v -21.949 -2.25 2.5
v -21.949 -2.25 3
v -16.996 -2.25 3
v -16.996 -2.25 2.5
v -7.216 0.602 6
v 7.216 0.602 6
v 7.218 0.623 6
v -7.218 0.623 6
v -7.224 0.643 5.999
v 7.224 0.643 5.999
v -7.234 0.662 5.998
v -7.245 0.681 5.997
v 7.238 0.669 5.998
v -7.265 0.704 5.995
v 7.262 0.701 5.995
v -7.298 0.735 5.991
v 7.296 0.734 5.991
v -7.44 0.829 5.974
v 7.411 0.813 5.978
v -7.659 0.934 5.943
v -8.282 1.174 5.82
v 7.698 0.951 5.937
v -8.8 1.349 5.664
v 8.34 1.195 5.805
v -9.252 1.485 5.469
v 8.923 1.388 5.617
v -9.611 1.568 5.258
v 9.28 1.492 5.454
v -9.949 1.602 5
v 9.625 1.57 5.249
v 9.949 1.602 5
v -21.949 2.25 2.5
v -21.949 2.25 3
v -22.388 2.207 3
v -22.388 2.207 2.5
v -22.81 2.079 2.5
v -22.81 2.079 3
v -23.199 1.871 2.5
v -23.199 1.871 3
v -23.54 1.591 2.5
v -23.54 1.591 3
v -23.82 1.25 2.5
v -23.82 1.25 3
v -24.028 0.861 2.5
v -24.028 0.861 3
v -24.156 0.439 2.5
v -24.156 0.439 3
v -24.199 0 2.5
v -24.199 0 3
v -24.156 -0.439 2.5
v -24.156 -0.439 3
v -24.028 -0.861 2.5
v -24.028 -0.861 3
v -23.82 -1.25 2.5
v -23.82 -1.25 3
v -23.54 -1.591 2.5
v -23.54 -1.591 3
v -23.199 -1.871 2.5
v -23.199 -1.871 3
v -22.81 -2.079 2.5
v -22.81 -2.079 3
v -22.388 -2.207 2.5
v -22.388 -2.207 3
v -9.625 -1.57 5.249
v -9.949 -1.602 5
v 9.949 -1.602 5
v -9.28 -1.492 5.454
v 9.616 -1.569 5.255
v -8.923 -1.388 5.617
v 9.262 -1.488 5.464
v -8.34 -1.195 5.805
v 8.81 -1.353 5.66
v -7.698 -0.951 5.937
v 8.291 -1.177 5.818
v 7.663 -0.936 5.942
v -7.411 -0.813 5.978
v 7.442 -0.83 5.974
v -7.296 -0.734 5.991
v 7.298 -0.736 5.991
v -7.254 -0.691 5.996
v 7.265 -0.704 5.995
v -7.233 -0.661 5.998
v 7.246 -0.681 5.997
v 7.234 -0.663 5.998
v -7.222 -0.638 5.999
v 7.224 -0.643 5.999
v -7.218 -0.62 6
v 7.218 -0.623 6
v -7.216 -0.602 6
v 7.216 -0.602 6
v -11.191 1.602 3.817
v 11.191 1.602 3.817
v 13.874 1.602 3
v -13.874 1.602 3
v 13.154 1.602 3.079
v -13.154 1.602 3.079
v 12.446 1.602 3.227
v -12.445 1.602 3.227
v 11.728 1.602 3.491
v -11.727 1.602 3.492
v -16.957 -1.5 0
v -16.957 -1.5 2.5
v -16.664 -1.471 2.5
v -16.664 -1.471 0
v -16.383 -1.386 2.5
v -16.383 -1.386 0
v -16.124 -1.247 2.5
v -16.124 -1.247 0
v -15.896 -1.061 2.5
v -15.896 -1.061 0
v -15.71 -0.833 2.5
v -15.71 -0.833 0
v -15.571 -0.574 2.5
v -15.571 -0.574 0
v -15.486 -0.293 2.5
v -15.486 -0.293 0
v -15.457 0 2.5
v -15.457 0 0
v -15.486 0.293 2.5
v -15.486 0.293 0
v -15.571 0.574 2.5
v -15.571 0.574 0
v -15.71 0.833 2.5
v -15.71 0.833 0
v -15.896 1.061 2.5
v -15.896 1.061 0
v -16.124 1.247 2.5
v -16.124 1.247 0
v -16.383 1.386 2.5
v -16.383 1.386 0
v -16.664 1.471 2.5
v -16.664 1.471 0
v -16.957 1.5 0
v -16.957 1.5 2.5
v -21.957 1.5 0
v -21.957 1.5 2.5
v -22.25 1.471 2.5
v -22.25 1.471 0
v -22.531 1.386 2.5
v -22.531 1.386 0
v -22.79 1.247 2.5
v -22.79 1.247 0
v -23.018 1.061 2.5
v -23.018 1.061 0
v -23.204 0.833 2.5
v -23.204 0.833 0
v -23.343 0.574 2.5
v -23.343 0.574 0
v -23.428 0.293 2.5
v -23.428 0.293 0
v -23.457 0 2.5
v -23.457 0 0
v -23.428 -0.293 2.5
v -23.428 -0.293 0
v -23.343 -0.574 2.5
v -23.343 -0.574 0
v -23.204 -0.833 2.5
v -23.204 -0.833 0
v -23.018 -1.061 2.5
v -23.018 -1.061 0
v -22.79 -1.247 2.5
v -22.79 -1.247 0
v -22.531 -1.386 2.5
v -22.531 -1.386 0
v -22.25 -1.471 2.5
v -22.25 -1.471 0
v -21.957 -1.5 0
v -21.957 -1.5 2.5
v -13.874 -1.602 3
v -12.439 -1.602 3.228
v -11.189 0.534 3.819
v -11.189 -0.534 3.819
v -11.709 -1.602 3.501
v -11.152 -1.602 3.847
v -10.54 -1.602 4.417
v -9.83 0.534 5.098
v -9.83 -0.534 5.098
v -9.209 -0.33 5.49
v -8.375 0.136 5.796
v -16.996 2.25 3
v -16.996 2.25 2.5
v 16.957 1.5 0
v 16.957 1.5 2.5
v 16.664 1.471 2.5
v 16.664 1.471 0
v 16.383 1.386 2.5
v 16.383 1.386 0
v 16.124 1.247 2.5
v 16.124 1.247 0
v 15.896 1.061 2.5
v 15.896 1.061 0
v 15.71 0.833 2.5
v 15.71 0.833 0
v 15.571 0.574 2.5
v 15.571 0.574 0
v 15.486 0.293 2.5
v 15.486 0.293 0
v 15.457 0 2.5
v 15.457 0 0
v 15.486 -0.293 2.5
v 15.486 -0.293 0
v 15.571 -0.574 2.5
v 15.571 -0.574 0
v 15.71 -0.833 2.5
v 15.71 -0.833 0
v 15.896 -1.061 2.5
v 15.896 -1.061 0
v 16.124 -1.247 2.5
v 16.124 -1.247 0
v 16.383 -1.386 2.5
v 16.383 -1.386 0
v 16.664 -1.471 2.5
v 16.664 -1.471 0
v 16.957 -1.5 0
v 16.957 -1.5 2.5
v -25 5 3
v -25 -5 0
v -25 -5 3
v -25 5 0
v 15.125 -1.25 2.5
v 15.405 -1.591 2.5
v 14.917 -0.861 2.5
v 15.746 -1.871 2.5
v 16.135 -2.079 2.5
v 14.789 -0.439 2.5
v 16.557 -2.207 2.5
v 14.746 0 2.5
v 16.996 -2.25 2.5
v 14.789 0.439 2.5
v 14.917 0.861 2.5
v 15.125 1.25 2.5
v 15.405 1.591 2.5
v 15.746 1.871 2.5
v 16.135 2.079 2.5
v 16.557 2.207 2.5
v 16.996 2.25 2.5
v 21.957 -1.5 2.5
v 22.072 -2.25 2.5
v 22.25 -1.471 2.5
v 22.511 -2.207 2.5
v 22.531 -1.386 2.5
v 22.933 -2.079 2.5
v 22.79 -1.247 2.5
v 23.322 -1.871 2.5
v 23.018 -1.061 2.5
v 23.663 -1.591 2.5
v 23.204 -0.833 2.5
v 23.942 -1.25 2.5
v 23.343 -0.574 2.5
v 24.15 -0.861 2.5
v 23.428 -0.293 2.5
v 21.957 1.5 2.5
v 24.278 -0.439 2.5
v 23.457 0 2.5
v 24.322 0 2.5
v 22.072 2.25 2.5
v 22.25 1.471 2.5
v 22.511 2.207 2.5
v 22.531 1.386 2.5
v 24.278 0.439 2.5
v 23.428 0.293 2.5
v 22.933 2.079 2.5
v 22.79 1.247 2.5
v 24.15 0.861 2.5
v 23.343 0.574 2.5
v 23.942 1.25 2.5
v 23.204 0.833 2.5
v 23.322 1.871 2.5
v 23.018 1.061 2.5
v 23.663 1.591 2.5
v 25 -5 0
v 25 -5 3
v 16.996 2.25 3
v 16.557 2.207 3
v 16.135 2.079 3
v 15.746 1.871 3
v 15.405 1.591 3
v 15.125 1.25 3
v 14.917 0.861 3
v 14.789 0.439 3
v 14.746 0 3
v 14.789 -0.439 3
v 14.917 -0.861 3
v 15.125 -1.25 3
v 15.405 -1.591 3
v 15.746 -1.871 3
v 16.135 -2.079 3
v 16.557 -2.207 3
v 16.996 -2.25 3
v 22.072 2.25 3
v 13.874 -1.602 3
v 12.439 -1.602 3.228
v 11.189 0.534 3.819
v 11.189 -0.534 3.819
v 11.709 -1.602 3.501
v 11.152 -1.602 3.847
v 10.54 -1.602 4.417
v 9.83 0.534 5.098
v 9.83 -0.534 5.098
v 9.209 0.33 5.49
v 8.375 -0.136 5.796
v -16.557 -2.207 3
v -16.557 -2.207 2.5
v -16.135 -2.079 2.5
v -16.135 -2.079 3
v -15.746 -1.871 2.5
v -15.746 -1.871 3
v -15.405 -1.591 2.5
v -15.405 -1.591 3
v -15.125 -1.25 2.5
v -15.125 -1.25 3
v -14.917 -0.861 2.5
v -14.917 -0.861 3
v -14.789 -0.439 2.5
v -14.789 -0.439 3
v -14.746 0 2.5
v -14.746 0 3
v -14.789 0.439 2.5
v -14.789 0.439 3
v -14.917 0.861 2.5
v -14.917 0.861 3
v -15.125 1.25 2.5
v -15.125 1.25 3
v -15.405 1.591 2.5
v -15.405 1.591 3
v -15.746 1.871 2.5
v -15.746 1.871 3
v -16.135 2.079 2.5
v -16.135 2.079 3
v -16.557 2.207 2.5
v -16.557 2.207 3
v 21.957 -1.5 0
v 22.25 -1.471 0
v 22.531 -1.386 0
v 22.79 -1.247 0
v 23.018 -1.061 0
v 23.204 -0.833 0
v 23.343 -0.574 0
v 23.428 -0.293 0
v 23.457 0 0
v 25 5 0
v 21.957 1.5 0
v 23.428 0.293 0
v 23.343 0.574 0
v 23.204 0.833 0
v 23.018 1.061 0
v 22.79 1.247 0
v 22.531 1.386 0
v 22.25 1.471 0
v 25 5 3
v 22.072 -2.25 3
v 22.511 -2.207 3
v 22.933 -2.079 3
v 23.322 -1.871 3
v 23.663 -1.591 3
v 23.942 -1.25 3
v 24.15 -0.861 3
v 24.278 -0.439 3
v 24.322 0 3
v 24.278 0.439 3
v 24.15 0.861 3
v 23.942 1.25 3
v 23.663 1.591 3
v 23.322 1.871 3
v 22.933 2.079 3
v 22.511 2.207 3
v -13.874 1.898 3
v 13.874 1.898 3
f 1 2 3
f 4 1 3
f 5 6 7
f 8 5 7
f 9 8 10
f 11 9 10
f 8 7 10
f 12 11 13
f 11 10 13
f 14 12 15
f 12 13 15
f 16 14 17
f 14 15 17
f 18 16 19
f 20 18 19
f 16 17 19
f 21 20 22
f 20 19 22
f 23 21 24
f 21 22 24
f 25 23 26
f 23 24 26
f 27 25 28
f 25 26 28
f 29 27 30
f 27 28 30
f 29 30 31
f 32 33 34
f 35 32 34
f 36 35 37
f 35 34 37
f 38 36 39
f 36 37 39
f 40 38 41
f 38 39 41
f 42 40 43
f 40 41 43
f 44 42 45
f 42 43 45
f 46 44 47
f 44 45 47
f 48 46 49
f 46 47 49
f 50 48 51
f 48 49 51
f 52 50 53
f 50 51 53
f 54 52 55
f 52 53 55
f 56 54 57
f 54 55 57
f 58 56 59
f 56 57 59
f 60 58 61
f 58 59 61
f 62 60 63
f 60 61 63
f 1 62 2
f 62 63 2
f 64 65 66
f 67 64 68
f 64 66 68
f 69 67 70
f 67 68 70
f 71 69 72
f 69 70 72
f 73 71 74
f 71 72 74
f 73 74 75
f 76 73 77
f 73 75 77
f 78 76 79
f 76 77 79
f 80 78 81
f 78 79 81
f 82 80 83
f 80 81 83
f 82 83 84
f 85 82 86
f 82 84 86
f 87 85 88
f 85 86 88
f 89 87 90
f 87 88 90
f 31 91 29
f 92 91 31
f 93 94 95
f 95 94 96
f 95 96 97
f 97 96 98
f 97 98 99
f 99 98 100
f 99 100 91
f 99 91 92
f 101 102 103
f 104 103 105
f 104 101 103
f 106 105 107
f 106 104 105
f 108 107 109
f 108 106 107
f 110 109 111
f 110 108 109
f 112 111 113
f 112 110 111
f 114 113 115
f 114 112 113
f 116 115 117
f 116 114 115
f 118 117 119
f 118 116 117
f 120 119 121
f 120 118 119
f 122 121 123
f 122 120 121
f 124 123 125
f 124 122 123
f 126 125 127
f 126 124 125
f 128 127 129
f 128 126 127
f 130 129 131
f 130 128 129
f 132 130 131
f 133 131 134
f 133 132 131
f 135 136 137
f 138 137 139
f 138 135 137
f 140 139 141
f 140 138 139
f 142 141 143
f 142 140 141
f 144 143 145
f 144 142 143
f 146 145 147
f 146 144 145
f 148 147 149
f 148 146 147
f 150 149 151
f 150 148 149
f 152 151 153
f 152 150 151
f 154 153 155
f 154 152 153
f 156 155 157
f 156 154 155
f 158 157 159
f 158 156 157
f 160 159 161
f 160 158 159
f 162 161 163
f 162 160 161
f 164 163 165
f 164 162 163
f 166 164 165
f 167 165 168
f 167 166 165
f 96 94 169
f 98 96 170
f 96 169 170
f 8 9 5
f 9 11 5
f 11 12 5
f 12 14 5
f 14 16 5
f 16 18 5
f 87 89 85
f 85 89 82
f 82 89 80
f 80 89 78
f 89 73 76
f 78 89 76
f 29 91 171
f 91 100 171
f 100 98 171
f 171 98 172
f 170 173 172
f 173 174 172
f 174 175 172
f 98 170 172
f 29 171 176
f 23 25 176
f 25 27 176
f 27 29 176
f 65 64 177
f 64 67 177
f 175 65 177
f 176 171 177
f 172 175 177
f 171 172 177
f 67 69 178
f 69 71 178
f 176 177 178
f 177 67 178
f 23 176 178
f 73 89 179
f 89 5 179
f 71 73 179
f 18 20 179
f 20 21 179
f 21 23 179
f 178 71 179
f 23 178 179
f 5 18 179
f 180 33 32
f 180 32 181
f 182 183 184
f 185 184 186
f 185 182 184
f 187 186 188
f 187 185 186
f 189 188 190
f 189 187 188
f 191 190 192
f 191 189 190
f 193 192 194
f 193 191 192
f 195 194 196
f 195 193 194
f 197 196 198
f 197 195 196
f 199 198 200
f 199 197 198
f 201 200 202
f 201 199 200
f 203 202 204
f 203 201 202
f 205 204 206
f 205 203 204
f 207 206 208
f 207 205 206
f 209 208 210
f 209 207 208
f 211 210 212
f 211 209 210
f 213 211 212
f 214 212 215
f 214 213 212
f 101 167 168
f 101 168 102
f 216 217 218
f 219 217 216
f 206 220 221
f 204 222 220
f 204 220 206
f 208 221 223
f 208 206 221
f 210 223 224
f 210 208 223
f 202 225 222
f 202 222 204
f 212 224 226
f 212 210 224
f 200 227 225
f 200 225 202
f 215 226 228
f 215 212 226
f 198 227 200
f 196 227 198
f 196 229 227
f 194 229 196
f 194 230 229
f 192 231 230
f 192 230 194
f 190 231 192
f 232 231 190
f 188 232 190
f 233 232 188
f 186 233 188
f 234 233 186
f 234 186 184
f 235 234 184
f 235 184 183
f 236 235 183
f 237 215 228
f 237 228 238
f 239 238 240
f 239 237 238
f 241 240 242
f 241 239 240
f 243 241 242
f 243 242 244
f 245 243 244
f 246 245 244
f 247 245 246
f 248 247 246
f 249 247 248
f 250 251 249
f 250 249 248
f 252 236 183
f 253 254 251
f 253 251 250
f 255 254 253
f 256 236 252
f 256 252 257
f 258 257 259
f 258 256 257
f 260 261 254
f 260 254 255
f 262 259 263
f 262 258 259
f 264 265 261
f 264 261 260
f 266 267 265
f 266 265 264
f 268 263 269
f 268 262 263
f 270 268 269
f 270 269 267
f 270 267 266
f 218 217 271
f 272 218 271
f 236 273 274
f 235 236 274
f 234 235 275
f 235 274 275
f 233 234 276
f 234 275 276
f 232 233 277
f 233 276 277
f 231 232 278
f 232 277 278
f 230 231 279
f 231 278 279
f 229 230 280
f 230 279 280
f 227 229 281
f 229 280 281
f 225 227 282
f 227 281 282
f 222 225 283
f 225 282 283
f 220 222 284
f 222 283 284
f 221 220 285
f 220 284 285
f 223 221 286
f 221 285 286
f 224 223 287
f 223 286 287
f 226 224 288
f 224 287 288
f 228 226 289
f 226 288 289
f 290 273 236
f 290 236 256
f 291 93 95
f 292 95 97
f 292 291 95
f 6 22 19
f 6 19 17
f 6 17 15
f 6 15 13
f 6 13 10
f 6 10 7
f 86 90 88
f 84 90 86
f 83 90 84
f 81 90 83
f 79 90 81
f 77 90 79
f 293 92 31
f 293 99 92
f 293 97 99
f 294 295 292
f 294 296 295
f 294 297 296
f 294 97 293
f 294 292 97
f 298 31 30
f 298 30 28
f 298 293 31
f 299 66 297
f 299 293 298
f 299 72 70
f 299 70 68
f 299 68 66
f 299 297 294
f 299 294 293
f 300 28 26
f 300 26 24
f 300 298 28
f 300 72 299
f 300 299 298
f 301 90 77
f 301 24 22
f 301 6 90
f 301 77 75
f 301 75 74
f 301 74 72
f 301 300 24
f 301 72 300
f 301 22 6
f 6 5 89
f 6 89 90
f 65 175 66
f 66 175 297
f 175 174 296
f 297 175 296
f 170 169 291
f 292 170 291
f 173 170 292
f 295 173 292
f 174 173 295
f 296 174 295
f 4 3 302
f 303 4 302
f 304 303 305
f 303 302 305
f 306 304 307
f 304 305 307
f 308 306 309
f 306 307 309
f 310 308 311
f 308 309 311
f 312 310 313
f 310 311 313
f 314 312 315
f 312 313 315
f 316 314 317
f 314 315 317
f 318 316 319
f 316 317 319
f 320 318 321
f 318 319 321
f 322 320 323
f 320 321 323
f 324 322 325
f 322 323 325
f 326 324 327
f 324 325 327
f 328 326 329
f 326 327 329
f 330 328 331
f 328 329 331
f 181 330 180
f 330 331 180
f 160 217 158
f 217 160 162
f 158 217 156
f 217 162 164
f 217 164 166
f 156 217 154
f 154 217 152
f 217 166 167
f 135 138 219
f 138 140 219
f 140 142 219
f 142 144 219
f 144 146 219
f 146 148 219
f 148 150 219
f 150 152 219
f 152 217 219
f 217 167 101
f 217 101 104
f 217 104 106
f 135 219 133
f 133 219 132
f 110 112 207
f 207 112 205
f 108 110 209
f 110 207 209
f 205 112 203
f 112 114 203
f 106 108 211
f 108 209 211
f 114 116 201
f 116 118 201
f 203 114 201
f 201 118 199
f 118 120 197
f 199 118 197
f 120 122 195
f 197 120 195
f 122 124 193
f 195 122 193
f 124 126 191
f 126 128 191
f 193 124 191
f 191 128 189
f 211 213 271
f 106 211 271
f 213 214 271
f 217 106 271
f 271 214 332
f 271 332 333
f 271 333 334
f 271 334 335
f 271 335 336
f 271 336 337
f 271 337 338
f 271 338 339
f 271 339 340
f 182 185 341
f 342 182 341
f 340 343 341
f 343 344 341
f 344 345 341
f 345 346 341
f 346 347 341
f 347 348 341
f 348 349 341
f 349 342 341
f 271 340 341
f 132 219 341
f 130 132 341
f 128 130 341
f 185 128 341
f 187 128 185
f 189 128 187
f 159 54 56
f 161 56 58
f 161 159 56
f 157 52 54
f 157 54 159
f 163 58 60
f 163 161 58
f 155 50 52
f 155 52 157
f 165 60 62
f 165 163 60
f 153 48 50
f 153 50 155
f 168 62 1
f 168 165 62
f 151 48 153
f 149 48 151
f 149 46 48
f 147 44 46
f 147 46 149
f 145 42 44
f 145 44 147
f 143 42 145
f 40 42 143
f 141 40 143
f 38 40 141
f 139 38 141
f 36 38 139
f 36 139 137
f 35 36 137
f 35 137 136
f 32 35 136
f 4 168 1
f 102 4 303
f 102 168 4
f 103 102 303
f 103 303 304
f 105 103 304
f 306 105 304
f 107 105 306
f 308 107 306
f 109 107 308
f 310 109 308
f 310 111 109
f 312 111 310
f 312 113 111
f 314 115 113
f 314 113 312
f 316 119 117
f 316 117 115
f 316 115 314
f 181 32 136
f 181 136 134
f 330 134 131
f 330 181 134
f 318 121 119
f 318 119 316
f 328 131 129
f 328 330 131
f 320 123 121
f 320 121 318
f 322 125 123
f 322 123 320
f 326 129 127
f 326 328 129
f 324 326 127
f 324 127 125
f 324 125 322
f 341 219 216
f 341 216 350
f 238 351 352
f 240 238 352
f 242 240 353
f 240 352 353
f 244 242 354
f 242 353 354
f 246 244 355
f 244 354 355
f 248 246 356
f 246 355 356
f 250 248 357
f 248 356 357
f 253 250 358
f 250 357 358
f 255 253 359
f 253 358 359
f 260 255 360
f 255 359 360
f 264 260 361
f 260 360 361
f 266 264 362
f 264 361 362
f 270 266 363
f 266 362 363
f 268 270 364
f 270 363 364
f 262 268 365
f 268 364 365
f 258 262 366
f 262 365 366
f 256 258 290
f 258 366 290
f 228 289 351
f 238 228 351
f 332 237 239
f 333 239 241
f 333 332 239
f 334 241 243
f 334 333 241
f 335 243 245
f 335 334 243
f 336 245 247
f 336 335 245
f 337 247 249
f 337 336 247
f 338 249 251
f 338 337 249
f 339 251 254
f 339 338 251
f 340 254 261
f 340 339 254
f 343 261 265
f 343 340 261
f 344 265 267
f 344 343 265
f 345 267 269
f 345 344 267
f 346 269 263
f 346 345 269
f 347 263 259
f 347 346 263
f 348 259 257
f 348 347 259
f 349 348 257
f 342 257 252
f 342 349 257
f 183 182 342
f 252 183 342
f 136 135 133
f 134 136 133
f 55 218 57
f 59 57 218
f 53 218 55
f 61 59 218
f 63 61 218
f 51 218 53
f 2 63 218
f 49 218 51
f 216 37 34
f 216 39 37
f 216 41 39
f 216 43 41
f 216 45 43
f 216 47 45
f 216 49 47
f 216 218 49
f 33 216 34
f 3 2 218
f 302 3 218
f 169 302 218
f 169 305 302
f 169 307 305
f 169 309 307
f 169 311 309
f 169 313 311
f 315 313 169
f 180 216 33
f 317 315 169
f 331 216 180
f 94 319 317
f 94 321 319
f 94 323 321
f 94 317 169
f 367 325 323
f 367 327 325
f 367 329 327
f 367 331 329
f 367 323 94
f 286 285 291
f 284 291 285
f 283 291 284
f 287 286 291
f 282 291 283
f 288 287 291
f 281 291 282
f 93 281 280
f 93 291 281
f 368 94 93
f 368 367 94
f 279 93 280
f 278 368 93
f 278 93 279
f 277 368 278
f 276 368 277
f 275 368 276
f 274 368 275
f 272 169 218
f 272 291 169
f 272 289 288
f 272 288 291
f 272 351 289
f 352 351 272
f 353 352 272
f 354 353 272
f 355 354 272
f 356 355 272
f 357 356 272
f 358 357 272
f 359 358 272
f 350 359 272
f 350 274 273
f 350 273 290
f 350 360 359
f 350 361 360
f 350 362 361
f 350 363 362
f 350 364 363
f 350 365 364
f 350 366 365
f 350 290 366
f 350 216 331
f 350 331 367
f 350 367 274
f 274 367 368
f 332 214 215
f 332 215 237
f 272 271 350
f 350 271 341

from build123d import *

# Parameters (mm, degrees)
SKETCH_W        = 50
SKETCH_H        = 10
PAD_DEPTH       = 3
SKETCH001_W     = 27.748524
SKETCH001_H     = 3.203372
PAD001_DEPTH    = 3
POCKET_DEPTH    = 3.5
FILLET_R        = 1
FILLET001_R     = 1
POCKET001_DEPTH = 0.5


with BuildPart() as part:
    # Sketch → Pad (new body)
    with BuildSketch(Plane.XY):
        Rectangle(SKETCH_W, SKETCH_H)
        with BuildLine():
            ThreePointArc((-21.956885, 1.5), (-23.456885, 0), (-21.956885, -1.5))
            Line((-21.956885, -1.5), (-16.956885, -1.5))
            ThreePointArc((-16.956885, -1.5), (-15.456885, 0), (-16.956885, 1.5))
            Line((-21.956885, 1.5), (-16.956885, 1.5))
        make_face(mode=Mode.SUBTRACT)
        with BuildLine():
            Line((16.956885, 1.5), (21.956885, 1.5))
            ThreePointArc((21.956885, -1.5), (23.456885, 0), (21.956885, 1.5))
            Line((16.956885, -1.5), (21.956885, -1.5))
            ThreePointArc((16.956885, 1.5), (15.456885, 0), (16.956885, -1.5))
        make_face(mode=Mode.SUBTRACT)
    extrude(amount=PAD_DEPTH)

    # Sketch001 (on DatumPlane) → Pad001 (join)
    with BuildSketch(Plane.XY.offset(3)):
        Rectangle(SKETCH001_W, SKETCH001_H)
    extrude(amount=PAD001_DEPTH)

    # Sketch002 (on DatumPlane) → Pocket (cut)
    with BuildSketch(Plane.XZ.offset(1.601686)):
        with BuildLine():
            add(Edge.make_bspline(
                [(-13.874262, 3), (-9.664405, 3.309267), (-11.317866, 5.566879), (-7.216269, 6)],
                knots=[0, 0, 0, 0, 1, 1, 1, 1], degree=3))
            Line((-7.216269, 6), (-7.216269, 6.383823))
            Line((-7.216269, 6.383823), (-14.222651, 6.336395))
            Line((-14.222651, 6.336395), (-14.222651, 3.364603))
            Line((-14.222651, 3.364603), (-13.874262, 3))
        make_face()
    pocket = extrude(amount=-POCKET_DEPTH, mode=Mode.SUBTRACT)

    # Fillet
    fillet_edges = [part.edges().sort_by_distance(p)[0] for p in [
        (3.328997, -1.601686, 6),
    ]]
    fillet(fillet_edges, radius=FILLET_R)

    # Fillet001
    fillet001_edges = [part.edges().sort_by_distance(p)[0] for p in [
        (3.328997, 1.601686, 6),
    ]]
    fillet(fillet001_edges, radius=FILLET001_R)

    # Mirrored: Pocket across Sketch002 V_Axis
    add(pocket.mirror(Plane(origin=(0, -1.601686, 0), x_dir=(0, -1, 0), z_dir=(1, 0, 0))), mode=Mode.SUBTRACT)

    # Sketch003 (on DatumPlane) → Pocket001 (cut)
    with BuildSketch(Plane.XY.offset(3)):
        with BuildLine():
            ThreePointArc((-21.948886, 2.25), (-24.198886, 0), (-21.948886, -2.25))
            Line((-21.948886, -2.25), (-16.996035, -2.25))
            ThreePointArc((-16.996035, -2.25), (-14.746035, 0), (-16.996035, 2.25))
            Line((-21.948886, 2.25), (-16.996035, 2.25))
        make_face()
        with BuildLine():
            ThreePointArc((16.996035, 2.25), (14.746035, 0), (16.996035, -2.25))
            Line((16.996035, -2.25), (22.07169, -2.25))
            ThreePointArc((22.07169, -2.25), (24.32169, 0), (22.07169, 2.25))
            Line((16.996035, 2.25), (22.07169, 2.25))
        make_face()
    extrude(amount=-POCKET001_DEPTH, mode=Mode.SUBTRACT)


solid = part.part
